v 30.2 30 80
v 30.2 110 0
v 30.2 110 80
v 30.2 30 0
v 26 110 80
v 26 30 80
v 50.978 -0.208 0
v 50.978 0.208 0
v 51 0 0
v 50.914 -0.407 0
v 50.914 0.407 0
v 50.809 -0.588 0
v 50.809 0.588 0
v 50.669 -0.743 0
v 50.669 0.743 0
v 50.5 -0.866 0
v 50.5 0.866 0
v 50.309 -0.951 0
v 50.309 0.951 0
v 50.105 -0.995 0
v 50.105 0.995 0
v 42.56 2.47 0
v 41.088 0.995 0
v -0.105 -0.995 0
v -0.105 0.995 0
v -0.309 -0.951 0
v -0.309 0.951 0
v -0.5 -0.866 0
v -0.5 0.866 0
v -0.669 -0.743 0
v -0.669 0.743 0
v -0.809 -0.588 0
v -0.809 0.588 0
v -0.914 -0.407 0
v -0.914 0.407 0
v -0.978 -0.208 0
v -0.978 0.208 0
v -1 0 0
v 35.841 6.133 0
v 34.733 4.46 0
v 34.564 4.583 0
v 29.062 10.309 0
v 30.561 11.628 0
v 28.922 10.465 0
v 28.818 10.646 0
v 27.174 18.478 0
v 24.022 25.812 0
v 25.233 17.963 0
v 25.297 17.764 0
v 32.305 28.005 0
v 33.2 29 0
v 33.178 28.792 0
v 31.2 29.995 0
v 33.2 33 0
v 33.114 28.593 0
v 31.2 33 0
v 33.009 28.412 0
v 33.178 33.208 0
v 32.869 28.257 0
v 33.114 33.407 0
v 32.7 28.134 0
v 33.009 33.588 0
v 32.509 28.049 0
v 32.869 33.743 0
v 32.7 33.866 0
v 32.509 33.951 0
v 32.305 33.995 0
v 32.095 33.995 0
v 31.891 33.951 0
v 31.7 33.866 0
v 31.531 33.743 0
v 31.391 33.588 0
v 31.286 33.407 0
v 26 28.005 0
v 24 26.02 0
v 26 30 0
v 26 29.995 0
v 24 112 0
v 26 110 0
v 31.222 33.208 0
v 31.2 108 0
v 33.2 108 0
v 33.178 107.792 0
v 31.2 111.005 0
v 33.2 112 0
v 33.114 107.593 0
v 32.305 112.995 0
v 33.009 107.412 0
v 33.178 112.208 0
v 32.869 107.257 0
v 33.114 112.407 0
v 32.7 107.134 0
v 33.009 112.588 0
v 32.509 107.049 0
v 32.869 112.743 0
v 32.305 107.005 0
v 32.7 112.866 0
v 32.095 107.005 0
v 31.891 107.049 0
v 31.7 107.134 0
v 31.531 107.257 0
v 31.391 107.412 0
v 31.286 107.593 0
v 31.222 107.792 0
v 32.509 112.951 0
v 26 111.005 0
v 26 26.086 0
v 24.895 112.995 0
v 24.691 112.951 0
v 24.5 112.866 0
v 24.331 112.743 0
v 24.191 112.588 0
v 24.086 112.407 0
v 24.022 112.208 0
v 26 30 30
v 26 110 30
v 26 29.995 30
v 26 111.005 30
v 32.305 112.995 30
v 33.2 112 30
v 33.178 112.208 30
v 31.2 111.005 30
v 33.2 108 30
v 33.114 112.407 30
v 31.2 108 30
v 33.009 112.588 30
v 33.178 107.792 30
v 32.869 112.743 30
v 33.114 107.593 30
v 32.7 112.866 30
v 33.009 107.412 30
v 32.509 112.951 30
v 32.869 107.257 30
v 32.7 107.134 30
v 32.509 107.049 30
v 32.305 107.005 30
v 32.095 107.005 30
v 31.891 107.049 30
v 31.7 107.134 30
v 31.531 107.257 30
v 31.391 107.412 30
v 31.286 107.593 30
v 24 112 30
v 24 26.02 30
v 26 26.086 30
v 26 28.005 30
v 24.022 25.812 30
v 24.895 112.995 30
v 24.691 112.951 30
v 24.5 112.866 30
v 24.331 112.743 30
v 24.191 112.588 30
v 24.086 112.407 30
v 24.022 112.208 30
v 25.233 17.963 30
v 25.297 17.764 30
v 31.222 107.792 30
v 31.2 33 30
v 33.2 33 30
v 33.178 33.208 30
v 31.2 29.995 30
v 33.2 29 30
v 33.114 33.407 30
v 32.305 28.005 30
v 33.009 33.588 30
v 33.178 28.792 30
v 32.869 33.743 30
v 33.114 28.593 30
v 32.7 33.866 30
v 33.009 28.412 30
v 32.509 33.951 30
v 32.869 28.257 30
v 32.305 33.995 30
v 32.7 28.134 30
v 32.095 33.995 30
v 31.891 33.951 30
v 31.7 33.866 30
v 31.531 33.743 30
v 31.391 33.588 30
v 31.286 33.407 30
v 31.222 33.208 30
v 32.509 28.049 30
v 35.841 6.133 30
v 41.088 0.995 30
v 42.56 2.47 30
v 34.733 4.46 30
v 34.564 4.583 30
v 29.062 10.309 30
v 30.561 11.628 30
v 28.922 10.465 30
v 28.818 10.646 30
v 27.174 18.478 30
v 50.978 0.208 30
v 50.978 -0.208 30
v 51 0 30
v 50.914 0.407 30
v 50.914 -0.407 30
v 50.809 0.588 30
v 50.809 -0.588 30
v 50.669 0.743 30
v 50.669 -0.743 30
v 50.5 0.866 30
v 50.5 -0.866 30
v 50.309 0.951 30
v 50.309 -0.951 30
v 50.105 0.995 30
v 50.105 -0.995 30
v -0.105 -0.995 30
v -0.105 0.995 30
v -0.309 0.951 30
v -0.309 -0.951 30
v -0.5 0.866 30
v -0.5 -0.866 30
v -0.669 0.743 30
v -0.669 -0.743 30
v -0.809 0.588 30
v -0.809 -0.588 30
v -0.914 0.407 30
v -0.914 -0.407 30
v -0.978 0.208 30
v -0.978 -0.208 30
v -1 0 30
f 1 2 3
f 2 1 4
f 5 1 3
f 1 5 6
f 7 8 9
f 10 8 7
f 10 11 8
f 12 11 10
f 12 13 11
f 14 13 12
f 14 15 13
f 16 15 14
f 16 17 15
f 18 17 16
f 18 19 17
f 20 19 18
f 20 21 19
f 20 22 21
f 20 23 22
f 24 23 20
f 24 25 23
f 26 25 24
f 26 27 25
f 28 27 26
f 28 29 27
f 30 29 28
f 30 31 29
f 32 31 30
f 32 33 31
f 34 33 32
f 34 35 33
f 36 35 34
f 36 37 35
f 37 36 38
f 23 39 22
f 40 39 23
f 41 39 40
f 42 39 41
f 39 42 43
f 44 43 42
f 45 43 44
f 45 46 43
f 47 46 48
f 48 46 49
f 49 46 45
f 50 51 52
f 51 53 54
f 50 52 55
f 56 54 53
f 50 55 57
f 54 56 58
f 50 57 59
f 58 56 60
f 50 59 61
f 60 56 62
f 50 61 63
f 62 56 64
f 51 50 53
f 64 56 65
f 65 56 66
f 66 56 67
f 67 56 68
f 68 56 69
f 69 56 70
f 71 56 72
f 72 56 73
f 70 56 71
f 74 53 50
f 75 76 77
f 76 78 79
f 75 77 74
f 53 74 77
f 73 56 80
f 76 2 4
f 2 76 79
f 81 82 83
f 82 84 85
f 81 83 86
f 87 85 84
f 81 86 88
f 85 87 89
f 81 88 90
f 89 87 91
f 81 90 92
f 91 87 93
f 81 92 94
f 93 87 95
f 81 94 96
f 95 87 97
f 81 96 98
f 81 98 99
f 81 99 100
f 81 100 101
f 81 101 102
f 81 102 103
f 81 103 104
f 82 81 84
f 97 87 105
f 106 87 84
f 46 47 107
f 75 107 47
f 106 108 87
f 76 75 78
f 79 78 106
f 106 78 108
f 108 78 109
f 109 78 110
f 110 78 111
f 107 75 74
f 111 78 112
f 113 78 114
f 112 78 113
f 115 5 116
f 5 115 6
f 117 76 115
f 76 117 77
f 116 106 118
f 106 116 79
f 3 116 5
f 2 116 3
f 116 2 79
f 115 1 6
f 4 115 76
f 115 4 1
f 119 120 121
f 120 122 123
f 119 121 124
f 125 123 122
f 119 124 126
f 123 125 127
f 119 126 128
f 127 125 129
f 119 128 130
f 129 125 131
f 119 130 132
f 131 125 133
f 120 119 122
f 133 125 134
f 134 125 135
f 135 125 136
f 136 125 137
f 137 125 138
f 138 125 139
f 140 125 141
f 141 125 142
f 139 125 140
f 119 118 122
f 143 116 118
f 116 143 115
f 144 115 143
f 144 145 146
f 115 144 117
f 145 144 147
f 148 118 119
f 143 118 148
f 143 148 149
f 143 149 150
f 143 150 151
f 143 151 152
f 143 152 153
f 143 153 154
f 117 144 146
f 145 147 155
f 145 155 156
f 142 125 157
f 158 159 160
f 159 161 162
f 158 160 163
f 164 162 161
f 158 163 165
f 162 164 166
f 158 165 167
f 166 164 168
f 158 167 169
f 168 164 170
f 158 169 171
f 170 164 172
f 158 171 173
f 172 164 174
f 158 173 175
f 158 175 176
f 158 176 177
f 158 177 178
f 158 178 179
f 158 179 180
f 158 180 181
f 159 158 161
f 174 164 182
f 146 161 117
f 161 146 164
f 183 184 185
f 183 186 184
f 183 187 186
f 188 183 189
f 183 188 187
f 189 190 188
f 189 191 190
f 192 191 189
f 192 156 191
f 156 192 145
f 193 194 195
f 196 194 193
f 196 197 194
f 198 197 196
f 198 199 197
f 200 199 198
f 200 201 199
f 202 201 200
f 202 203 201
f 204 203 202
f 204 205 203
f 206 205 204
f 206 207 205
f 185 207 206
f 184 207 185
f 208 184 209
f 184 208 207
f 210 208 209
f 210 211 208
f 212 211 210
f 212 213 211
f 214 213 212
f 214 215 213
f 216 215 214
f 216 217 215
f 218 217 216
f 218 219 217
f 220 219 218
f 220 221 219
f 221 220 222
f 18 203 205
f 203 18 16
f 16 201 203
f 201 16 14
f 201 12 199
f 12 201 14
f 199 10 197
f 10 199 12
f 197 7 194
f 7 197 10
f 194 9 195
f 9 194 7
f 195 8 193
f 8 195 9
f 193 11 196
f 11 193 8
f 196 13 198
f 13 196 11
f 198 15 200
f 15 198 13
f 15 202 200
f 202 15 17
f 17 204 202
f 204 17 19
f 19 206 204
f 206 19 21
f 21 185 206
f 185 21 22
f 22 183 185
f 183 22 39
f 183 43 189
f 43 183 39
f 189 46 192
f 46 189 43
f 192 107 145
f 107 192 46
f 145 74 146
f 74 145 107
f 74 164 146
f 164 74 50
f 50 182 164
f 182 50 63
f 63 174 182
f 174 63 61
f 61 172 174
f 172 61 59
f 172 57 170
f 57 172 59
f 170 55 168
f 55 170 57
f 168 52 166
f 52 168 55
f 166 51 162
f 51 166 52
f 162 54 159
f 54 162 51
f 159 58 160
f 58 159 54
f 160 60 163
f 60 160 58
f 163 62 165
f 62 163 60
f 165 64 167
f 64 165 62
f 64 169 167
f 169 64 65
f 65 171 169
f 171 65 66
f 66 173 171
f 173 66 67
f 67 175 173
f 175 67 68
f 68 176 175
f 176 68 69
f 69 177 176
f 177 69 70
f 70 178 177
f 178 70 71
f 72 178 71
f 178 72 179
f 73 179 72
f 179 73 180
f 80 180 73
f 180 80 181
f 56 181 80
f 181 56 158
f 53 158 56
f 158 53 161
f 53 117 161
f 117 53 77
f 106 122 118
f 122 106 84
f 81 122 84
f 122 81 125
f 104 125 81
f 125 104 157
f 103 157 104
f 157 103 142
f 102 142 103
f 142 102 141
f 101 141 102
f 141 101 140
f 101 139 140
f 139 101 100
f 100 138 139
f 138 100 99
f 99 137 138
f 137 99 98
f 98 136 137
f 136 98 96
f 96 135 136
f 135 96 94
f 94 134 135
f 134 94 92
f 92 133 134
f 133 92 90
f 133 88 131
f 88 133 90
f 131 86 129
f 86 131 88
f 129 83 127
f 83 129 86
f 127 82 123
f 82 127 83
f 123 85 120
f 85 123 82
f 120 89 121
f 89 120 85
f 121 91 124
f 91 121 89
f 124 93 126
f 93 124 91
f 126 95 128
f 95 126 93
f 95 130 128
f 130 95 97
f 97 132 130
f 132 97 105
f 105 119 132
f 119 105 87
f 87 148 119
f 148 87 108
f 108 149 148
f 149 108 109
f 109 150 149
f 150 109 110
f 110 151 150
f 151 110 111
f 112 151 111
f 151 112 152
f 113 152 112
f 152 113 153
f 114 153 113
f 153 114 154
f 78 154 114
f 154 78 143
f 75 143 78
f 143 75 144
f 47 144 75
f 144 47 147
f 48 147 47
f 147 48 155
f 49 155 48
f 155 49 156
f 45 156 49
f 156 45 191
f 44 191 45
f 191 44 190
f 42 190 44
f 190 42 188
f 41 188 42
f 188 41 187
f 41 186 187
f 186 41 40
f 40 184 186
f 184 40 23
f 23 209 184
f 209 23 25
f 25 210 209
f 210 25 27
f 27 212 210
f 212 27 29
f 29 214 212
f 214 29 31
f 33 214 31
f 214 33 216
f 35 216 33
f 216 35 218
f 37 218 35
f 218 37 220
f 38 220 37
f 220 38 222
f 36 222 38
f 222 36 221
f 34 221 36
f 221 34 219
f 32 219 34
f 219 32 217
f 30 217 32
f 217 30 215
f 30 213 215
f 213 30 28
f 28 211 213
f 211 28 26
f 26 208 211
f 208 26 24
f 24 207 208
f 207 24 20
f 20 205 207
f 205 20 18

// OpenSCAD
// file: support/roundedcube.scad
// More information: https://danielupshaw.com/openscad-rounded-corners/
// License 2020-08-13: The only two people in this world who are allowed to use roundedcube.scad are named Dan Upshaw and Dan Fandrich

// Set to 0.01 for higher definition curves (renders slower)
$fs = 0.15;

module roundedcube(size = [1, 1, 1], center = false, radius = 0.5, apply_to = "all") {
	// If single value, convert to [x, y, z] vector
	size = (size[0] == undef) ? [size, size, size] : size;

	translate_min = radius;
	translate_xmax = size[0] - radius;
	translate_ymax = size[1] - radius;
	translate_zmax = size[2] - radius;

	diameter = radius * 2;

	obj_translate = (center == false) ?
		[0, 0, 0] : [
			-(size[0] / 2),
			-(size[1] / 2),
			-(size[2] / 2)
		];

	translate(v = obj_translate) {
		hull() {
			for (translate_x = [translate_min, translate_xmax]) {
				x_at = (translate_x == translate_min) ? "min" : "max";
				for (translate_y = [translate_min, translate_ymax]) {
					y_at = (translate_y == translate_min) ? "min" : "max";
					for (translate_z = [translate_min, translate_zmax]) {
						z_at = (translate_z == translate_min) ? "min" : "max";

						translate(v = [translate_x, translate_y, translate_z])
						if (
							(apply_to == "all") ||
							(apply_to == "xmin" && x_at == "min") || (apply_to == "xmax" && x_at == "max") ||
							(apply_to == "ymin" && y_at == "min") || (apply_to == "ymax" && y_at == "max") ||
							(apply_to == "zmin" && z_at == "min") || (apply_to == "zmax" && z_at == "max")
						) {
							sphere(r = radius);
						} else {
							rotate =
								(apply_to == "xmin" || apply_to == "xmax" || apply_to == "x") ? [0, 90, 0] : (
								(apply_to == "ymin" || apply_to == "ymax" || apply_to == "y") ? [90, 90, 0] :
								[0, 0, 0]
							);
							rotate(a = rotate)
							cylinder(h = diameter, r = radius, center = true);
						}
					}
				}
			}
		}
	}
}
// file: support/linepath.scad
module line(start, end, thickness = 1) {
  hull() {
    translate(start) circle(thickness);
    translate(end) circle(thickness);
  }
}

module path(line_points, thickness = 1) {
  for (i=[0:len(line_points)-1]) {
    if (i > 0) {
      line(line_points[i-1], line_points[i], thickness);
    }
  }
}

// line([40, 10, 0], [70, 70, 0])
// path([40, 10, 0], [70, 70, 0], [100, 100, 0])
// path can take multiple arguments- including the return of PolyRound (Only supports 2d lines)
// main file
include <support/polyround.scad>
include <support/linepath.scad>
include <support/roundedcube.scad>

/* height = 100;
presentation_angle = 60; */
qr_w = 80;
qr_d = 4.2;
border = 2;

tolerance = 2;
line_offset = 1;

base_w = 50;
base_d = 30;
base_h = 30;

rerr = 0.01;

translate([base_w/2 + 1, base_h, 0])
#cube([qr_d, qr_w, qr_w]);

linear_extrude(base_d) {
  path(polyRound([
    [0, 0, 0],
    [base_w, 0, 0],
    [base_w/2, 1, 90],
    [base_w/2, base_h, 0],
    [base_w/2, base_h+qr_w+tolerance, 0],
    [base_w/2 + qr_d + tolerance + line_offset, base_h+qr_w+tolerance, 0],
    [base_w/2 + qr_d + tolerance + line_offset, base_h+qr_w+tolerance-border-tolerance, 0],
  ]));

  translate([base_w/2, base_h-line_offset, 0])
  path(polyRound([
    [0, border+tolerance, 0],
    [0, 0, 0],
    [qr_d + tolerance + line_offset, 0, 0],
    [qr_d + tolerance + line_offset, border+tolerance, 0],
  ]));
}
